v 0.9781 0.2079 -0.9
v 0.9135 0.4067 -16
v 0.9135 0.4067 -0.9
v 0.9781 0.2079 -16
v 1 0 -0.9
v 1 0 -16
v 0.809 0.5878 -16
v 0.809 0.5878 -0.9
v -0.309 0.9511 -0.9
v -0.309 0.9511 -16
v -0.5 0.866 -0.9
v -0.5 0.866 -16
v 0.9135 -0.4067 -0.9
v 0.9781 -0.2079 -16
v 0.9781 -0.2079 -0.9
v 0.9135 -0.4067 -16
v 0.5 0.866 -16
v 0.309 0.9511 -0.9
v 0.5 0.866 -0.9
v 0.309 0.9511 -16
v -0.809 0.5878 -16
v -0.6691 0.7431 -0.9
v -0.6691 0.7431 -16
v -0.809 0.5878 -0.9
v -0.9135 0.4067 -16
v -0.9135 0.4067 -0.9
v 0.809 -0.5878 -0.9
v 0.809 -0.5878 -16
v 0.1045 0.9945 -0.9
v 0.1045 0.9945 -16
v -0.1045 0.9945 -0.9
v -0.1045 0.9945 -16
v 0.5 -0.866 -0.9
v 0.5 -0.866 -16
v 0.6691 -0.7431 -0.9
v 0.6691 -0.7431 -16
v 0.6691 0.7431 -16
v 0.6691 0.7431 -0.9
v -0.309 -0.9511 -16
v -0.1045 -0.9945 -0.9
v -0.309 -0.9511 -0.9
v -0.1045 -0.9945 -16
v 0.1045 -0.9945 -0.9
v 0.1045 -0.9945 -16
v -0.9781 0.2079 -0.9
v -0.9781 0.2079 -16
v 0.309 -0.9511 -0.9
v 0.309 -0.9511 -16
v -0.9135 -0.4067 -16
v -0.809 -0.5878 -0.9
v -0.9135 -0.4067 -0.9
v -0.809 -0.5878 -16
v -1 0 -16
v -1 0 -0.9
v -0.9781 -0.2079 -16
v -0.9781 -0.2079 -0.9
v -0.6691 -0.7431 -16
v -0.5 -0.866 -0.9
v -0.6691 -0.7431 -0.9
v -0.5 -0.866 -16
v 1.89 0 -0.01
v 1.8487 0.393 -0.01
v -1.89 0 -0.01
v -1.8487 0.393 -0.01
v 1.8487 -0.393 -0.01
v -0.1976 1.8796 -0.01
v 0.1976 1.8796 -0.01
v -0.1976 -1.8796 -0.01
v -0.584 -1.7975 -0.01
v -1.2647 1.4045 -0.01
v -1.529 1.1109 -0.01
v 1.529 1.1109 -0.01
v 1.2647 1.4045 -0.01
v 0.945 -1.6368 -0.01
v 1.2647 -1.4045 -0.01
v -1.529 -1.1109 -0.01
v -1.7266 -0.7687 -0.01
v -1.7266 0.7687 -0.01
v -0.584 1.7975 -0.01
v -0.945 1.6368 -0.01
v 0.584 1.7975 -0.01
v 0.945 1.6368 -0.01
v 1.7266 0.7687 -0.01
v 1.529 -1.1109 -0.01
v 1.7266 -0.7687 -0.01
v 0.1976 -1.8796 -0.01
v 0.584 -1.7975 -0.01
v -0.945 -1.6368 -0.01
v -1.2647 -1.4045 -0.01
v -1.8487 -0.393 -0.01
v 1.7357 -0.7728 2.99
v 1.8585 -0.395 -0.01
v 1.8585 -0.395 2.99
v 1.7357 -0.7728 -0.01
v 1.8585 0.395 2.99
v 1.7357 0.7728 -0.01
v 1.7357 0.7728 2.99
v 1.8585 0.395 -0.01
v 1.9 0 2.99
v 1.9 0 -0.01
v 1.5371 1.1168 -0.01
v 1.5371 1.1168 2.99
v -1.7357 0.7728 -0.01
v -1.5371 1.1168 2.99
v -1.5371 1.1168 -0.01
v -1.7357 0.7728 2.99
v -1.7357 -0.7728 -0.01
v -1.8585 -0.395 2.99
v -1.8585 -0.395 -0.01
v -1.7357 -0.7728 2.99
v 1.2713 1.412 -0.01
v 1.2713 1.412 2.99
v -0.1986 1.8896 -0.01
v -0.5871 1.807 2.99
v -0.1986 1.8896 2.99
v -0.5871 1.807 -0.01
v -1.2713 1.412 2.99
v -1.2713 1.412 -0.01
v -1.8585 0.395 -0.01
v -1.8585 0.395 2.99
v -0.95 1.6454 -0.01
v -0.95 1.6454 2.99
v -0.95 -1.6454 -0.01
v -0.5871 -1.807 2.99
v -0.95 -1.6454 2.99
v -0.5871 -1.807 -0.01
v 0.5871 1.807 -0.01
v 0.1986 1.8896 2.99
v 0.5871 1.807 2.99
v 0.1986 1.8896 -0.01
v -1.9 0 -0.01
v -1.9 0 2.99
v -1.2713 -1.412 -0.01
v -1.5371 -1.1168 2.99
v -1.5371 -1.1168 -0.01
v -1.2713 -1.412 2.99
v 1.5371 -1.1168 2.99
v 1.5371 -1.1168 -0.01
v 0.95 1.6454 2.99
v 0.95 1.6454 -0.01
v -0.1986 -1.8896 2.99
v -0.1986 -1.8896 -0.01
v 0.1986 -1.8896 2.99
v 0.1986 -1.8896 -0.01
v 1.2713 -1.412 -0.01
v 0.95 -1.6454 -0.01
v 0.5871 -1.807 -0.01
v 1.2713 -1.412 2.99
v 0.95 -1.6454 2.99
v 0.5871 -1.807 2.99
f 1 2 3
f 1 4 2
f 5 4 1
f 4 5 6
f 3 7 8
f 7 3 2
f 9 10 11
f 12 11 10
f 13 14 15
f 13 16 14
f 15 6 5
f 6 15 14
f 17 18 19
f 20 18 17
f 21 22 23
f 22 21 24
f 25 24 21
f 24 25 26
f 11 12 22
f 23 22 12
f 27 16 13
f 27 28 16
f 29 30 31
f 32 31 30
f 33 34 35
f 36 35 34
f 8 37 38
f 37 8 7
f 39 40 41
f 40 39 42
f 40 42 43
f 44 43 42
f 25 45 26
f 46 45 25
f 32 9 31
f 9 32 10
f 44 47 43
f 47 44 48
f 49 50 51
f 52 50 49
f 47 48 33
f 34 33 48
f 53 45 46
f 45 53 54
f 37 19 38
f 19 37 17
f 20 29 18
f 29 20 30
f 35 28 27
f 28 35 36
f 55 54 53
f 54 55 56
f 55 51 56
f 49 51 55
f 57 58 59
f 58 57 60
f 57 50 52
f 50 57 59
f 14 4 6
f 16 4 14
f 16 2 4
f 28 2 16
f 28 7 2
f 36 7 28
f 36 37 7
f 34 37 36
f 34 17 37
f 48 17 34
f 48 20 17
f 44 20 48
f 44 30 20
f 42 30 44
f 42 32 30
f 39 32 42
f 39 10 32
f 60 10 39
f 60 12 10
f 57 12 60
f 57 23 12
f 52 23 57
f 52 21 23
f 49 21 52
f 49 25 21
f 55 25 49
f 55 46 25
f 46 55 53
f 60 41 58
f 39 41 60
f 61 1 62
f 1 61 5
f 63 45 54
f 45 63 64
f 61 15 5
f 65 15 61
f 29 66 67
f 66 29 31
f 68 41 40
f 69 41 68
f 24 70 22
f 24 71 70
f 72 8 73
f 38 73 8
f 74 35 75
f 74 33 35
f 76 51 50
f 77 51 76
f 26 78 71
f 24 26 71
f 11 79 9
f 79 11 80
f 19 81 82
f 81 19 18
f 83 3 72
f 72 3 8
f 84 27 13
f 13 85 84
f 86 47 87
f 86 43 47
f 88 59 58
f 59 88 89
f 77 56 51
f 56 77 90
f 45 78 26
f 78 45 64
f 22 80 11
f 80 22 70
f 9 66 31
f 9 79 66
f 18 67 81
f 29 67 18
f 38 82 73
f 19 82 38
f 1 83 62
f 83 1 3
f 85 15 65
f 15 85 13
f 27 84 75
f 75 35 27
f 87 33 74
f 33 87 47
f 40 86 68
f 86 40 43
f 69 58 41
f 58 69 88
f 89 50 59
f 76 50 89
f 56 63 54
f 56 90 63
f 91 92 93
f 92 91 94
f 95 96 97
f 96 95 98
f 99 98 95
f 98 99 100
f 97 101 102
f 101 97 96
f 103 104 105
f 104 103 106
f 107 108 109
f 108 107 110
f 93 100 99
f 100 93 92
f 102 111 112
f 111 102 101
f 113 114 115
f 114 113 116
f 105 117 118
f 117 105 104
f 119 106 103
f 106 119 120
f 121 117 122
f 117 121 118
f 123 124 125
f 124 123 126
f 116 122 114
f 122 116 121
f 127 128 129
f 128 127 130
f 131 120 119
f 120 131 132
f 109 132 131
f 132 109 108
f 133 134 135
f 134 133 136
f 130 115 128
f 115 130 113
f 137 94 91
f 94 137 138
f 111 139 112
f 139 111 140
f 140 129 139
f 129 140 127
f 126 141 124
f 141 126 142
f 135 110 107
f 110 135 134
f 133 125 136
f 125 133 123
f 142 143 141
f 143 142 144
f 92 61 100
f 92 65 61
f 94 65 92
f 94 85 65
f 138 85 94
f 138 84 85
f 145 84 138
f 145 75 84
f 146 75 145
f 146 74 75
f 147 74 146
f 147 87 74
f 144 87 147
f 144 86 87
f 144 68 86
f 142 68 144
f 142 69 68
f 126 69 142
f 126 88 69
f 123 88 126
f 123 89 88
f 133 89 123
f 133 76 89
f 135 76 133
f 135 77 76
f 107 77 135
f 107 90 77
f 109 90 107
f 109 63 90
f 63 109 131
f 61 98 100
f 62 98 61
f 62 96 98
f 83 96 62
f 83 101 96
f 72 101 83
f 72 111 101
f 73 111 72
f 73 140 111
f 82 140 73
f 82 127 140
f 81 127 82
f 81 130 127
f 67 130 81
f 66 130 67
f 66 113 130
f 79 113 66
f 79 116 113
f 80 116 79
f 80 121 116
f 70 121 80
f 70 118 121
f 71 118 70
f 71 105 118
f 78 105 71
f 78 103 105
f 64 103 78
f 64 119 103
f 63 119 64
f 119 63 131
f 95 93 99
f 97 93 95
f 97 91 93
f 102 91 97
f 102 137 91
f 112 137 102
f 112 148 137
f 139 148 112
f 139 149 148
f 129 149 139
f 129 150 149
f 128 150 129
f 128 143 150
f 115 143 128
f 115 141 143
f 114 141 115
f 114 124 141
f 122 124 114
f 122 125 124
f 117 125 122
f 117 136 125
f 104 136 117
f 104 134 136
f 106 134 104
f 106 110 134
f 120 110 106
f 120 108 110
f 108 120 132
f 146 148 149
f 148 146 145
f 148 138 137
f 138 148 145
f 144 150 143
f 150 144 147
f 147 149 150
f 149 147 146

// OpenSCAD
/*
 * A screw with countersunk, flat head.
 * This model has no thread. It's used as cutting die for screw holes.
 *
 * d: diameter of the screw
 * dh: diameter of the head
 * ah: angle of the head
 * l: length of the *complete* screw (including head)
 * head_elongation: length of optional cylinder with diameter dh, placed on top of the head.
 *                  Useful since this model is mostly used as a cutting die. (default 0)
 * fn: circle resolution $fn for OpenSCAD (default 30)
 * echo_hh: Print the head height (for debug purposes, default: false)
 * screw_color: color of the screw (bolt and head)
 * elongation_color: color of the elongation cylinder (if specified)
 *
 * The screw head is lying on z=0, the screw bolt is going downwards (-z).
 * The screw is centered on x/y.
 * The elongation (if specified), goes upwards (+z).
 *
 * DIN 963 metric screws have a head angle (ah) of 90°.
 *
 * DIN 963 metric screw head diameters:
 *  • M 2     3,8 mm
 *  • M 2,5   4,7 mm
 *  • M 3     5,6 mm
 *  • M 4     7,5 mm
 *  • M 5     9,2 mm
 *  • M 6     11 mm
 *  • M 8     14,5 mm
 *  • M 10    18 mm
 *  • M 12    22  mm 
*/

module screw_flat_head(d, dh, ah, l, head_elongation=0, fn=30, echo_hh=false, screw_color="DodgerBlue", elongation_color="Orchid") {
    head_cylinder_height = (dh/2)/tan(ah/2);
    if (echo_hh) {
        echo(head_height=head_cylinder_height);
    }
    color(screw_color) {
        translate([0,0,-l]) cylinder(d=d, h=l, $fn=fn);
        translate([0,0,-head_cylinder_height]) cylinder(d1=0, d2=dh, h=head_cylinder_height, $fn=fn);
    }
    if (head_elongation > 0) {
        color(elongation_color)
            translate([0,0,-0.01]) cylinder(d=dh, h=head_elongation, $fn=fn);
    }
}

module sfh_m2_16() {
    screw_flat_head(d=2, dh=3.8, ah=90, l=16, echo_hh=true, head_elongation=3);
}


sfh_m2_16();
